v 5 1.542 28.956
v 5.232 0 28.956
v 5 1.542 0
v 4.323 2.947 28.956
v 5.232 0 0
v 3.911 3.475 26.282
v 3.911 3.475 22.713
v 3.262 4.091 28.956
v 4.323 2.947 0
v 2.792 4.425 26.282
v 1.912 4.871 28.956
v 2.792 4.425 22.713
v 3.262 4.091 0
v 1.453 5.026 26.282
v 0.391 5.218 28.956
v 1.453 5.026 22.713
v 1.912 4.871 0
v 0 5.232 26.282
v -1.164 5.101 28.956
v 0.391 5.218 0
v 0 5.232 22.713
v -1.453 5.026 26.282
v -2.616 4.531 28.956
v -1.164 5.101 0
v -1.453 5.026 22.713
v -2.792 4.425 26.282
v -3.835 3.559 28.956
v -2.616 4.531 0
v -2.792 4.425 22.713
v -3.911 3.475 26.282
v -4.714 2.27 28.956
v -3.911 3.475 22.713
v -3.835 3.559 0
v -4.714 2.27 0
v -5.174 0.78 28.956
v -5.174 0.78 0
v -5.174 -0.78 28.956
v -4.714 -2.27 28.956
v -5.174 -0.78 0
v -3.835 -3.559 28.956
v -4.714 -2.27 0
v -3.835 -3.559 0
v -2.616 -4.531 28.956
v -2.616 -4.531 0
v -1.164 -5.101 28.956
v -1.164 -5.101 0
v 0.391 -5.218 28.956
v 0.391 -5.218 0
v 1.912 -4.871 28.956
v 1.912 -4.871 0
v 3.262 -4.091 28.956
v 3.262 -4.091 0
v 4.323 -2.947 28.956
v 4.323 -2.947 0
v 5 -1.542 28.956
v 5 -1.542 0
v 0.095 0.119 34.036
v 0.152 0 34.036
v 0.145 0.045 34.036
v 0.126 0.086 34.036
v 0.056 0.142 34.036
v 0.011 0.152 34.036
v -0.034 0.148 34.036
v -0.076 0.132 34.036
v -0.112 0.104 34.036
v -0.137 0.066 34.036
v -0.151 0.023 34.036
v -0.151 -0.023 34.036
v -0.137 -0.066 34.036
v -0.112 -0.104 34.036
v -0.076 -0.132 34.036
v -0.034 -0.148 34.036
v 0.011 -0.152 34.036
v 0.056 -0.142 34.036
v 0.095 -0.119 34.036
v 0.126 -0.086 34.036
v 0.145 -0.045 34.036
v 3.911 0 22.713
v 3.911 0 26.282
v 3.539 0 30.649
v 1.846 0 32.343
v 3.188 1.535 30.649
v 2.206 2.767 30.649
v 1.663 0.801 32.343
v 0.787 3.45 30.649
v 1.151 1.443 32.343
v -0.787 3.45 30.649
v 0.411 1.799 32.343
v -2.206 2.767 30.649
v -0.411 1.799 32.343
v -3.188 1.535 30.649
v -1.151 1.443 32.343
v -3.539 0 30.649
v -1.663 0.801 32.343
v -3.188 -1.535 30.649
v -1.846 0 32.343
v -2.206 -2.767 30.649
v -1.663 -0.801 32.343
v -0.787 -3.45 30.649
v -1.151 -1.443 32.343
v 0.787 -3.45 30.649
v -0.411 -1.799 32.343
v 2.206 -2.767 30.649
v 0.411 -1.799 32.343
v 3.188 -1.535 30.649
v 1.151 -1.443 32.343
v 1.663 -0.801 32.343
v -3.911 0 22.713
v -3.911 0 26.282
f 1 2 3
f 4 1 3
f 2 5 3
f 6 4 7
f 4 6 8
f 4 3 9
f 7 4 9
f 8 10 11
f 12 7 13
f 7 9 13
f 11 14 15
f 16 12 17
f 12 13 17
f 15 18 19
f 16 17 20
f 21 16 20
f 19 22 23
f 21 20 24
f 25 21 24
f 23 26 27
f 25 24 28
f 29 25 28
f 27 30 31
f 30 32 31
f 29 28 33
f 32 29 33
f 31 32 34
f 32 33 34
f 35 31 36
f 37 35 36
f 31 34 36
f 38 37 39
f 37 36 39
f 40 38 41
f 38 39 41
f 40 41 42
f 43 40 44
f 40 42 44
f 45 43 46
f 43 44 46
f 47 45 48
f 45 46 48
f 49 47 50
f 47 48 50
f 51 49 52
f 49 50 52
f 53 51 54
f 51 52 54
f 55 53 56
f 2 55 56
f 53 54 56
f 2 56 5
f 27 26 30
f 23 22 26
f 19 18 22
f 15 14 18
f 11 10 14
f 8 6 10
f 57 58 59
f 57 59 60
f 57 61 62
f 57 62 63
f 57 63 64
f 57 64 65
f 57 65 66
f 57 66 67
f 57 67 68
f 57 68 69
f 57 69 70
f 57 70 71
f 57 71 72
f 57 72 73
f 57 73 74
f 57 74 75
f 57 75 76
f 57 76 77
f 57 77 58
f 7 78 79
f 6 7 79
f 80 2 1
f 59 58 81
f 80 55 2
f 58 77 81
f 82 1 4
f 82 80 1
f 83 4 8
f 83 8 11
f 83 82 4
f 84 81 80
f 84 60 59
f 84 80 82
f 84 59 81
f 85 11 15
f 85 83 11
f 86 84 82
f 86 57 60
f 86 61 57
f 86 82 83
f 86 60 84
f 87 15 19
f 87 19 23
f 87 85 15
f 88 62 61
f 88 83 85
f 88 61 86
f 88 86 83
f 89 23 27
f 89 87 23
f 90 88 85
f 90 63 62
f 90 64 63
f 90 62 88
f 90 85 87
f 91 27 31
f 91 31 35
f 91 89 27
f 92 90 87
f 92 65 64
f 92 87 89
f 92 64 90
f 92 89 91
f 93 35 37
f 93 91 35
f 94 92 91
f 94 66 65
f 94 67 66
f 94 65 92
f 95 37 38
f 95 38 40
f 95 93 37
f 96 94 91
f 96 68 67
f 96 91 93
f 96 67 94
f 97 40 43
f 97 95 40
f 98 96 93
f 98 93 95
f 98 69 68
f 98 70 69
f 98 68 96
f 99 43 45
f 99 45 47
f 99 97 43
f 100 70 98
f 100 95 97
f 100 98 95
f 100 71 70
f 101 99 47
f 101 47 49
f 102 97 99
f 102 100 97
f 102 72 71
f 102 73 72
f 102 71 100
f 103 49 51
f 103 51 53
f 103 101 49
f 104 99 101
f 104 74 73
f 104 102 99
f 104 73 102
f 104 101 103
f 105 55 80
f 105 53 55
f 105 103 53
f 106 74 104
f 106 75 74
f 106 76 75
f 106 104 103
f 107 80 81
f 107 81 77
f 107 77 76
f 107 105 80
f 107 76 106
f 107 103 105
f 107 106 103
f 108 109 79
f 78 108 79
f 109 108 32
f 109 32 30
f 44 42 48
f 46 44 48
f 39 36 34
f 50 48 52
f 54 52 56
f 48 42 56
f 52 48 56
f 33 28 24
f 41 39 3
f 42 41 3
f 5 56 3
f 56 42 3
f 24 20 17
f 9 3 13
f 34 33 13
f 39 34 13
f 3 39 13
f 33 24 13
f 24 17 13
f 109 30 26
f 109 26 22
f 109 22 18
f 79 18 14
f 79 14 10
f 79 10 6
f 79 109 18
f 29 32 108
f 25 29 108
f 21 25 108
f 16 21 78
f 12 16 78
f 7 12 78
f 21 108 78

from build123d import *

# Parameters (mm, degrees)
F0_R     = 5.232212
F1_DEPTH = 34.036
F2_SIZE  = 5.08
F3_W     = 7.82259
F3_H     = 3.568198
F4_DEPTH = 25.4


with BuildPart() as f1:
    # F0 (on Top) → F1 (new body)
    with BuildSketch(Plane.XY):
        Circle(F0_R)
    extrude(amount=F1_DEPTH)

    # F2
    f2_edges = [f1.edges().sort_by_distance(p)[0] for p in [
        (-5.232212, 0, 34.036),
    ]]
    chamfer(f2_edges, length=F2_SIZE)

    # F3 (on Front) → F4 (cut)
    with BuildSketch(Plane.XZ):
        with Locations((0, 24.497494)):
            Rectangle(F3_W, F3_H)
    extrude(amount=-F4_DEPTH, mode=Mode.SUBTRACT)


solid = f1.part
